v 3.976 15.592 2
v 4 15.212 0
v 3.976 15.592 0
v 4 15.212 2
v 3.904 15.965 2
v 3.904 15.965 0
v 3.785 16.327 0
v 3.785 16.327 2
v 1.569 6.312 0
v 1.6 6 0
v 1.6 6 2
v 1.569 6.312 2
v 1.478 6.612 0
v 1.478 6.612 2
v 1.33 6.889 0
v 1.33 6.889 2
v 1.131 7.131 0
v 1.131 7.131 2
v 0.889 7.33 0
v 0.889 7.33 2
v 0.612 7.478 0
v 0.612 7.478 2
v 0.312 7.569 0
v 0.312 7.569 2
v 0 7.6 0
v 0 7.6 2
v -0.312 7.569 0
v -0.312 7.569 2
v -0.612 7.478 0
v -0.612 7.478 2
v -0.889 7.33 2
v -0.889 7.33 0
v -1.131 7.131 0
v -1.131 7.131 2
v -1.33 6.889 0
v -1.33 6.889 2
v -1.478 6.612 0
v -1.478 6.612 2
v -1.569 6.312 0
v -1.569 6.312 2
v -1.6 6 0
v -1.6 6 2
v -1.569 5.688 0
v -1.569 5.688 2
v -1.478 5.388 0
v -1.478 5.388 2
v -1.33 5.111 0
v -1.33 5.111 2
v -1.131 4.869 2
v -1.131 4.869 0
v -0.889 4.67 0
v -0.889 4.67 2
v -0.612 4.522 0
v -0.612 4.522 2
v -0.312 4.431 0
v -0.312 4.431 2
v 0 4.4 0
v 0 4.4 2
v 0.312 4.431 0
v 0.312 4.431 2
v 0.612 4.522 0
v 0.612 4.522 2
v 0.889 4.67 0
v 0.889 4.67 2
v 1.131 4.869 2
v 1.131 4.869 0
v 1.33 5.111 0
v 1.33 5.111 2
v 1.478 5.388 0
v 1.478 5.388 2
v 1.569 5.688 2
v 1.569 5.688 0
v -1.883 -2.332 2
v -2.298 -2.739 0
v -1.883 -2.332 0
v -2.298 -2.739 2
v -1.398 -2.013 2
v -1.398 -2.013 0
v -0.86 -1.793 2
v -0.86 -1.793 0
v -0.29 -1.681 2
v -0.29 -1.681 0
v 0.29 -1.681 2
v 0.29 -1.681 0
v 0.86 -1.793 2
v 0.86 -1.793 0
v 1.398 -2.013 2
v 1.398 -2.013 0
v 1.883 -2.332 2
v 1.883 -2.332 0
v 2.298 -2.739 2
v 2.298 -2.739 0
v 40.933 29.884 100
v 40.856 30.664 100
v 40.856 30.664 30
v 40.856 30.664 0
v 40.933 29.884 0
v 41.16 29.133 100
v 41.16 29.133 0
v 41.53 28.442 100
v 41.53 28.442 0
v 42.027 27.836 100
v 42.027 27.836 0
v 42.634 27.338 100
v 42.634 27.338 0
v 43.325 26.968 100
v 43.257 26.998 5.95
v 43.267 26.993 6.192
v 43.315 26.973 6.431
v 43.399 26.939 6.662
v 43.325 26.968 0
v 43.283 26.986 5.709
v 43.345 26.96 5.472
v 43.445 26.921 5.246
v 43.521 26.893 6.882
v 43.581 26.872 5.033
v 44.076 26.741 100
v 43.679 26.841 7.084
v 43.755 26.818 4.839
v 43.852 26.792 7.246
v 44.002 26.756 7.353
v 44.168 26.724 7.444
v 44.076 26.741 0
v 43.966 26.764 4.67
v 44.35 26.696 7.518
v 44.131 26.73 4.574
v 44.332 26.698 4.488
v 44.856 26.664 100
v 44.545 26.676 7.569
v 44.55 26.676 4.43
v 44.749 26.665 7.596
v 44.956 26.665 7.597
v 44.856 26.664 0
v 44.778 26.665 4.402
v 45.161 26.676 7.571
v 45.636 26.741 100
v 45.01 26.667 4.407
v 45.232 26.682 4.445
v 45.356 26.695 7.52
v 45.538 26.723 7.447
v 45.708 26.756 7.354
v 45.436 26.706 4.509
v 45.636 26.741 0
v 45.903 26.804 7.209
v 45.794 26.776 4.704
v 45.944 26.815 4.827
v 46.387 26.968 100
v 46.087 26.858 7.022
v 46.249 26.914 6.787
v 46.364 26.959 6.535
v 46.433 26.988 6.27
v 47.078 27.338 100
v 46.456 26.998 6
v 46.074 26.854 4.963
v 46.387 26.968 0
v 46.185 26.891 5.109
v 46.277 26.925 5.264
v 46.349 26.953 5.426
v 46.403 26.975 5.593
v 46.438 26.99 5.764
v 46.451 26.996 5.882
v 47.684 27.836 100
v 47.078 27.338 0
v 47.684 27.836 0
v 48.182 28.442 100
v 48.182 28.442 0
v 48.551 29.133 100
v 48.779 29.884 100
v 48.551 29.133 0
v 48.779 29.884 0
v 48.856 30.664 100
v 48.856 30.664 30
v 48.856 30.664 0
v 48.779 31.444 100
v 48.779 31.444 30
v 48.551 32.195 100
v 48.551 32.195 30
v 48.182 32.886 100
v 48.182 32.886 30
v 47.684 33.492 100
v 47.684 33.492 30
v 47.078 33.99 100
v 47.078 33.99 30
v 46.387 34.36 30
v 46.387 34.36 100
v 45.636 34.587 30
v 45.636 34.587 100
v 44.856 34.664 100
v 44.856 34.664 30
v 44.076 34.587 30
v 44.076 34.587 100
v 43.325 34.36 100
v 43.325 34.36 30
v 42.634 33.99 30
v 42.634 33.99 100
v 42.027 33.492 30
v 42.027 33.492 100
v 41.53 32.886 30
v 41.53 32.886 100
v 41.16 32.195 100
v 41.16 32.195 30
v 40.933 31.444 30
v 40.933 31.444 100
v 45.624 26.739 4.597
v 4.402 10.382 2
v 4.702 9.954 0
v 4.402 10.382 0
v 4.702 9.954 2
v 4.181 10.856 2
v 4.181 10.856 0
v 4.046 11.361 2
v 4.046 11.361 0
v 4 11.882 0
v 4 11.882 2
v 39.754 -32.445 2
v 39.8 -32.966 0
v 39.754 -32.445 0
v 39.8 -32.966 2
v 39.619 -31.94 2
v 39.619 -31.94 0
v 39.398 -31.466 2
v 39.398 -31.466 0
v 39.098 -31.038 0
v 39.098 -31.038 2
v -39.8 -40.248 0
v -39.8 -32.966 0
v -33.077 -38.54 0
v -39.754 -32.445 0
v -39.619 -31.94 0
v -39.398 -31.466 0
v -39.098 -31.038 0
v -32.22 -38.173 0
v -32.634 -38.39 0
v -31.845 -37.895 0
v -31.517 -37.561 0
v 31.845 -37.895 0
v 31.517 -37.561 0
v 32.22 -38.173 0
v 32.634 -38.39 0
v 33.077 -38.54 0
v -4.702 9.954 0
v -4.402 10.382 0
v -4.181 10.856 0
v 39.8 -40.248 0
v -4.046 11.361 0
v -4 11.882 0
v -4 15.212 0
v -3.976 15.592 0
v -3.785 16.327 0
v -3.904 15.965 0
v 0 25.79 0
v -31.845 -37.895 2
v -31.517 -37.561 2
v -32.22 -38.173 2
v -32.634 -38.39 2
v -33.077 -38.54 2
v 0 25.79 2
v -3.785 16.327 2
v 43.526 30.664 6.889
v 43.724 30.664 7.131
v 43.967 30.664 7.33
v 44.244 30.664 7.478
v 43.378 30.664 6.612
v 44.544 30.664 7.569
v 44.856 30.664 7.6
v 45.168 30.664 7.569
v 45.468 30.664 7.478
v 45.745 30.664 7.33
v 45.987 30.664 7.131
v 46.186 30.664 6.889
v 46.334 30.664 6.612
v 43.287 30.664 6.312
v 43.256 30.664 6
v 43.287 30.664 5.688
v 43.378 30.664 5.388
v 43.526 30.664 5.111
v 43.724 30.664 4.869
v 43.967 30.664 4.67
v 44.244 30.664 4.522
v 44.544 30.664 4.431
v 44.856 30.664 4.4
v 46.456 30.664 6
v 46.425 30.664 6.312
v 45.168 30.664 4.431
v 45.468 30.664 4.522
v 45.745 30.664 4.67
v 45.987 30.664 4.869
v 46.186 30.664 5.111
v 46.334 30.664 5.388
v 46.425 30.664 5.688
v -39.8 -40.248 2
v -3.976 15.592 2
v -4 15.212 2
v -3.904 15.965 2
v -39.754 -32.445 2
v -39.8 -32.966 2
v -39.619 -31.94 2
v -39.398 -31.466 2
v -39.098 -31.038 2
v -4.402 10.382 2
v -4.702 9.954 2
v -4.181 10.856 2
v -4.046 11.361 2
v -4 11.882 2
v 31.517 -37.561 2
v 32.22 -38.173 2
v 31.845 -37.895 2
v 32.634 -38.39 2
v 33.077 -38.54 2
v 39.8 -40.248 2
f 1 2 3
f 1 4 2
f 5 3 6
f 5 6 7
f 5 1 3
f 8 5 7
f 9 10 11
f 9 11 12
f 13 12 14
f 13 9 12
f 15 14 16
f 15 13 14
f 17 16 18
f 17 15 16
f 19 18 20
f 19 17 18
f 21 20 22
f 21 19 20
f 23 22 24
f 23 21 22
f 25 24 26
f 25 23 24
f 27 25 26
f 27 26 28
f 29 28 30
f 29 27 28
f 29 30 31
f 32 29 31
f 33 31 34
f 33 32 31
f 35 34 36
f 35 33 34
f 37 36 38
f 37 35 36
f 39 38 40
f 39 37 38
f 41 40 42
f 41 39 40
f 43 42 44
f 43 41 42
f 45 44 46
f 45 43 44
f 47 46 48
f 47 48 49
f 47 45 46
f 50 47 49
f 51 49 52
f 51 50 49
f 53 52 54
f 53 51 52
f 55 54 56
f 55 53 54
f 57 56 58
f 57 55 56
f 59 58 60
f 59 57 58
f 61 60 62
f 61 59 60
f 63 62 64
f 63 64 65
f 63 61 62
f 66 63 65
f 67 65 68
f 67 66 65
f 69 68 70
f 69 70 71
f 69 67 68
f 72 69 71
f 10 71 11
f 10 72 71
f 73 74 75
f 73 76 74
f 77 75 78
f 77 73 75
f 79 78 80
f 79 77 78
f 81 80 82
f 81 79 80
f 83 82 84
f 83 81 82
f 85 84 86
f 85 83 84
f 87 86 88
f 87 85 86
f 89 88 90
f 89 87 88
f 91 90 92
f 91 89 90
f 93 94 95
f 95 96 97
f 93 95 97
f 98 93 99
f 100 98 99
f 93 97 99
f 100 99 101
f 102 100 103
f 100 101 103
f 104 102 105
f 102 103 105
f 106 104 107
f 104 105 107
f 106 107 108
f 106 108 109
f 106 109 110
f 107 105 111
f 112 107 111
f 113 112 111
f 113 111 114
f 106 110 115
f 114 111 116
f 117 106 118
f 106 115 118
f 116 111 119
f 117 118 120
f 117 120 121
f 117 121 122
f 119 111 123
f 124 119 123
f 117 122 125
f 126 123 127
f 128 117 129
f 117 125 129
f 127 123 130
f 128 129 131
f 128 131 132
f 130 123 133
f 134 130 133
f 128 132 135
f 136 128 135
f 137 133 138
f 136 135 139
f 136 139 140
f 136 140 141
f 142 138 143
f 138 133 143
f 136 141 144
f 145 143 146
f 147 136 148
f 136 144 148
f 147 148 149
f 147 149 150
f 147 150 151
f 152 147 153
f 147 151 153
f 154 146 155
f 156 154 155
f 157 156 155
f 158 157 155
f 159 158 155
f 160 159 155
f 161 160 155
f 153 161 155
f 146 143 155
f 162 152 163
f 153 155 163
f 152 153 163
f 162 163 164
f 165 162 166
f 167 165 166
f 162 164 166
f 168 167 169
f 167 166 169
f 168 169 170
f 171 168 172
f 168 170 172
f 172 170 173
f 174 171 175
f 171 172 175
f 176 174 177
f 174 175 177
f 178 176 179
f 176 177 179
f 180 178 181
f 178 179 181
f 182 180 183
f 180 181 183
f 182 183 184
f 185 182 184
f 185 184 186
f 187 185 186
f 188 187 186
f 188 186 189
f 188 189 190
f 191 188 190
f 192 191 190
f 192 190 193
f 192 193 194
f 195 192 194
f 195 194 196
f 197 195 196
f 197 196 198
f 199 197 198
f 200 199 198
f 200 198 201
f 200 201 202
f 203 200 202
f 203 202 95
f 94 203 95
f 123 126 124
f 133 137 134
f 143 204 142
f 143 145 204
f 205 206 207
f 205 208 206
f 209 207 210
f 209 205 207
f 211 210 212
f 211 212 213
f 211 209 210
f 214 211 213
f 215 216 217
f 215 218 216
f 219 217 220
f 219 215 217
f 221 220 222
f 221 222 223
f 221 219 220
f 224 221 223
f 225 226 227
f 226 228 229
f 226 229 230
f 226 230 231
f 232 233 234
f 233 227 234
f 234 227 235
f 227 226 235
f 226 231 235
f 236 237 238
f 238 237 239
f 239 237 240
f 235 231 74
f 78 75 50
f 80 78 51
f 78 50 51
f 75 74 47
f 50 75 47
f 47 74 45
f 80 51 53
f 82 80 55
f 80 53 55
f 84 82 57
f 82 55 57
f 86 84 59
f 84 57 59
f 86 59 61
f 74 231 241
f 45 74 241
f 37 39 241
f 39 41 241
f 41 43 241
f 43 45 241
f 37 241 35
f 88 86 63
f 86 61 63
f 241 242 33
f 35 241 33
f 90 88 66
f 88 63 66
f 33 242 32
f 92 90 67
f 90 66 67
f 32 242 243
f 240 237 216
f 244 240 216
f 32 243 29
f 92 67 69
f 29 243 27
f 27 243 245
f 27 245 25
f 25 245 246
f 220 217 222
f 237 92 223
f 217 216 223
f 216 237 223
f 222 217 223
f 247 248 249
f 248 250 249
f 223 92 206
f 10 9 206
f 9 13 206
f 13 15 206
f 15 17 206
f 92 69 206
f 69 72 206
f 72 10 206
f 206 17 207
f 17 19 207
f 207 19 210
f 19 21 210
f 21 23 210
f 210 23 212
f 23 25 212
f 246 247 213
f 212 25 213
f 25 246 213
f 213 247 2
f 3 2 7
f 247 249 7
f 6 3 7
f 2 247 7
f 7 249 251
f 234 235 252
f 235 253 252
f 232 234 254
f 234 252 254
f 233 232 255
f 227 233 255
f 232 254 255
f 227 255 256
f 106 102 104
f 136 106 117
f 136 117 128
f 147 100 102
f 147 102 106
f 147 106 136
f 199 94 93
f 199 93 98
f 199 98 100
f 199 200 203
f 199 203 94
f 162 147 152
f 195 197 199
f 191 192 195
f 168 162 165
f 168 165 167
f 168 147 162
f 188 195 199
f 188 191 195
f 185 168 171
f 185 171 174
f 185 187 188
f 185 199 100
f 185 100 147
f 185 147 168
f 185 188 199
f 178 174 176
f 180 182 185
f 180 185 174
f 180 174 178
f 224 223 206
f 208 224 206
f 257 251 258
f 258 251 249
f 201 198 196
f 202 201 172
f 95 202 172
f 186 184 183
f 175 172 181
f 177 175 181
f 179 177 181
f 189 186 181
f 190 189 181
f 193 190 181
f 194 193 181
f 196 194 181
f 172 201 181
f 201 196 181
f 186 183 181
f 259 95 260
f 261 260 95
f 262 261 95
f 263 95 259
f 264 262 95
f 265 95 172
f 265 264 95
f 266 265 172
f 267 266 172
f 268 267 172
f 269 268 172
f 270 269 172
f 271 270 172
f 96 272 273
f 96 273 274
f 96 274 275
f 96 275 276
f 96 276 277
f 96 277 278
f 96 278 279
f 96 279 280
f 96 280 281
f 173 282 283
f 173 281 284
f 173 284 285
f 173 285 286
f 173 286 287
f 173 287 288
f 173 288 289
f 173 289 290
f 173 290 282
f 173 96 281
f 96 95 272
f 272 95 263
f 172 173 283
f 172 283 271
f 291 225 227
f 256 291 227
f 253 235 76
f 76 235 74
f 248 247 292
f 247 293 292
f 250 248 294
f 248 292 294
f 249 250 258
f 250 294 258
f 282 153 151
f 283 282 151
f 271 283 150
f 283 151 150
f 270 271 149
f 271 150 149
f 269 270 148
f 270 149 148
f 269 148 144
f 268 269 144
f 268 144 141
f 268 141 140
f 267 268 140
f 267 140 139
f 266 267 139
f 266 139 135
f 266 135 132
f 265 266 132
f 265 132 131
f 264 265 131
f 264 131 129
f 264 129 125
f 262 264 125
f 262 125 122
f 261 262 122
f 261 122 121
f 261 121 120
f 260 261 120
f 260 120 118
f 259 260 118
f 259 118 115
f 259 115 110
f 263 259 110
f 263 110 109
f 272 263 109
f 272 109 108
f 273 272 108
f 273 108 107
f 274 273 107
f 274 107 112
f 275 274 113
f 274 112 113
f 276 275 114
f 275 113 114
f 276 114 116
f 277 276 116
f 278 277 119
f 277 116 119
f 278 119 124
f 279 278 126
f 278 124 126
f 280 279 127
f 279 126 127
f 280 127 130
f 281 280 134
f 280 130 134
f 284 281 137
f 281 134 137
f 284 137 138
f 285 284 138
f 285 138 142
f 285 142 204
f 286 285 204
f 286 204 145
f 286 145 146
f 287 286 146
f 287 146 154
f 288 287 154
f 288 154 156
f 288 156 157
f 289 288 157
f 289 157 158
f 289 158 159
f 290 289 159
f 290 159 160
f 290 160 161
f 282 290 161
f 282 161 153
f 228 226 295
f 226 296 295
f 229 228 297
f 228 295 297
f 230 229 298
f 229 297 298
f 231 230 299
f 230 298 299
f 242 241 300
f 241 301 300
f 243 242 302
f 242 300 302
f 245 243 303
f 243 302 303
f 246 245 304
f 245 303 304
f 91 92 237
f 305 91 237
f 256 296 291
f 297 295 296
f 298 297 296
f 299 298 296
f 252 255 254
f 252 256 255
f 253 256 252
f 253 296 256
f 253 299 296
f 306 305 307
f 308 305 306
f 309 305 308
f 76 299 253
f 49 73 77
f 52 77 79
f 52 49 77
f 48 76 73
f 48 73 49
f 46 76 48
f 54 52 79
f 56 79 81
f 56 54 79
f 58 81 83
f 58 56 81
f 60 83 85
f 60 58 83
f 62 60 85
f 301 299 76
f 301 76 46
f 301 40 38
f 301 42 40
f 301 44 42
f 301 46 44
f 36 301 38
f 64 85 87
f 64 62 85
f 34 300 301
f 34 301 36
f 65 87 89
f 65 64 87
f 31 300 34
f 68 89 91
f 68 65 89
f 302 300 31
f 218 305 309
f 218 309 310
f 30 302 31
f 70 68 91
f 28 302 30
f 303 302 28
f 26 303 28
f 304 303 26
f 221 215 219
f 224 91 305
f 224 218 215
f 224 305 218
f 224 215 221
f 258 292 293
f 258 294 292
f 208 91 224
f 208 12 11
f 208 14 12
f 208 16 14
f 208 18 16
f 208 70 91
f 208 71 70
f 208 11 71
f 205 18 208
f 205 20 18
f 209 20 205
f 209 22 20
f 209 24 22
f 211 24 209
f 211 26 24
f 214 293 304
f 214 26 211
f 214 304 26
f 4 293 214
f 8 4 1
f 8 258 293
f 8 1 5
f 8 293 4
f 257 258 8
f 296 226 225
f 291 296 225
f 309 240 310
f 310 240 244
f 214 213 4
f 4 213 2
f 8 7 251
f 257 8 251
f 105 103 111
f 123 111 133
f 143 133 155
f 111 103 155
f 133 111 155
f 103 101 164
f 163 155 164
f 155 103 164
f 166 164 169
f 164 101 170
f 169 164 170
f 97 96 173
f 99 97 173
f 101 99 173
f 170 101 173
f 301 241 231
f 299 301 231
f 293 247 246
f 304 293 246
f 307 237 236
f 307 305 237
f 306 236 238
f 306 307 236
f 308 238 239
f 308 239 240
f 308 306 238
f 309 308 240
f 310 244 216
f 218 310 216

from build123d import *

# Parameters (mm, degrees)
F0_R     = 1.6
F1_DEPTH = 2
F2_DEPTH = 100
F3_DEPTH = 30
F5_D     = 3.2
F6_R     = 3


with BuildPart() as f1:
    # F0 (on Top) → F1 (new body)
    with BuildSketch(Plane.XY):
        Polygon((-32.1393804843, -38.3022221559), (0, 0), (32.1393804843, -38.3022221559), (39.7998249155, -40.2478127563), (39.7998249155, -31.8743460591), (4, 10.7902238982), (4, 15.7902238982), (0, 25.7902238982), (-4, 15.7902238982), (-4, 10.7902238982), (-39.7998249155, -31.8743460591), (-39.7998249155, -40.2478127563), align=None)
        with Locations((0, 6)):
            Circle(F0_R, mode=Mode.SUBTRACT)
    extrude(amount=F1_DEPTH)

    # F6
    f6_edges = [f1.edges().sort_by_distance(p)[0] for p in [
        (4, 15.790224, 1),
        (4, 10.790224, 1),
        (-4, 15.790224, 1),
        (-4, 10.790224, 1),
        (-39.799825, -31.874346, 1),
        (-32.13938, -38.302222, 1),
        (32.13938, -38.302222, 1),
        (39.799825, -31.874346, 1),
        (0, 0, 1),
    ]]
    fillet(f6_edges, radius=F6_R)


with BuildPart() as f2:
    # F0 (on Top) → F2 (new body)
    with BuildSketch(Plane.XY):
        with BuildLine():
            Line((40.8558703065, 30.6639820337), (48.8558703065, 30.6639820337))
            ThreePointArc((48.8558703065, 30.6639820337), (44.8558703065, 34.6639820337), (40.8558703065, 30.6639820337))
        make_face()
        with BuildLine():
            ThreePointArc((40.8558703065, 30.6639820337), (44.8558703065, 26.6639820337), (48.8558703065, 30.6639820337))
            Line((48.8558703065, 30.6639820337), (40.8558703065, 30.6639820337))
        make_face()
    extrude(amount=F2_DEPTH)

    # F0 (on Top) → F3 (cut)
    with BuildSketch(Plane.XY):
        with BuildLine():
            Line((40.8558703065, 30.6639820337), (48.8558703065, 30.6639820337))
            ThreePointArc((48.8558703065, 30.6639820337), (44.8558703065, 34.6639820337), (40.8558703065, 30.6639820337))
        make_face()
    extrude(amount=F3_DEPTH, mode=Mode.SUBTRACT)

    # F5 (through all)
    with Locations(Plane(origin=(0, 30.6639820337, 0), x_dir=(-1, 0, 0), z_dir=(0, 1, 0))):
        with Locations((-44.8558703065, 6)):
            Hole(F5_D / 2)


solid = Compound([f1.part, f2.part])
